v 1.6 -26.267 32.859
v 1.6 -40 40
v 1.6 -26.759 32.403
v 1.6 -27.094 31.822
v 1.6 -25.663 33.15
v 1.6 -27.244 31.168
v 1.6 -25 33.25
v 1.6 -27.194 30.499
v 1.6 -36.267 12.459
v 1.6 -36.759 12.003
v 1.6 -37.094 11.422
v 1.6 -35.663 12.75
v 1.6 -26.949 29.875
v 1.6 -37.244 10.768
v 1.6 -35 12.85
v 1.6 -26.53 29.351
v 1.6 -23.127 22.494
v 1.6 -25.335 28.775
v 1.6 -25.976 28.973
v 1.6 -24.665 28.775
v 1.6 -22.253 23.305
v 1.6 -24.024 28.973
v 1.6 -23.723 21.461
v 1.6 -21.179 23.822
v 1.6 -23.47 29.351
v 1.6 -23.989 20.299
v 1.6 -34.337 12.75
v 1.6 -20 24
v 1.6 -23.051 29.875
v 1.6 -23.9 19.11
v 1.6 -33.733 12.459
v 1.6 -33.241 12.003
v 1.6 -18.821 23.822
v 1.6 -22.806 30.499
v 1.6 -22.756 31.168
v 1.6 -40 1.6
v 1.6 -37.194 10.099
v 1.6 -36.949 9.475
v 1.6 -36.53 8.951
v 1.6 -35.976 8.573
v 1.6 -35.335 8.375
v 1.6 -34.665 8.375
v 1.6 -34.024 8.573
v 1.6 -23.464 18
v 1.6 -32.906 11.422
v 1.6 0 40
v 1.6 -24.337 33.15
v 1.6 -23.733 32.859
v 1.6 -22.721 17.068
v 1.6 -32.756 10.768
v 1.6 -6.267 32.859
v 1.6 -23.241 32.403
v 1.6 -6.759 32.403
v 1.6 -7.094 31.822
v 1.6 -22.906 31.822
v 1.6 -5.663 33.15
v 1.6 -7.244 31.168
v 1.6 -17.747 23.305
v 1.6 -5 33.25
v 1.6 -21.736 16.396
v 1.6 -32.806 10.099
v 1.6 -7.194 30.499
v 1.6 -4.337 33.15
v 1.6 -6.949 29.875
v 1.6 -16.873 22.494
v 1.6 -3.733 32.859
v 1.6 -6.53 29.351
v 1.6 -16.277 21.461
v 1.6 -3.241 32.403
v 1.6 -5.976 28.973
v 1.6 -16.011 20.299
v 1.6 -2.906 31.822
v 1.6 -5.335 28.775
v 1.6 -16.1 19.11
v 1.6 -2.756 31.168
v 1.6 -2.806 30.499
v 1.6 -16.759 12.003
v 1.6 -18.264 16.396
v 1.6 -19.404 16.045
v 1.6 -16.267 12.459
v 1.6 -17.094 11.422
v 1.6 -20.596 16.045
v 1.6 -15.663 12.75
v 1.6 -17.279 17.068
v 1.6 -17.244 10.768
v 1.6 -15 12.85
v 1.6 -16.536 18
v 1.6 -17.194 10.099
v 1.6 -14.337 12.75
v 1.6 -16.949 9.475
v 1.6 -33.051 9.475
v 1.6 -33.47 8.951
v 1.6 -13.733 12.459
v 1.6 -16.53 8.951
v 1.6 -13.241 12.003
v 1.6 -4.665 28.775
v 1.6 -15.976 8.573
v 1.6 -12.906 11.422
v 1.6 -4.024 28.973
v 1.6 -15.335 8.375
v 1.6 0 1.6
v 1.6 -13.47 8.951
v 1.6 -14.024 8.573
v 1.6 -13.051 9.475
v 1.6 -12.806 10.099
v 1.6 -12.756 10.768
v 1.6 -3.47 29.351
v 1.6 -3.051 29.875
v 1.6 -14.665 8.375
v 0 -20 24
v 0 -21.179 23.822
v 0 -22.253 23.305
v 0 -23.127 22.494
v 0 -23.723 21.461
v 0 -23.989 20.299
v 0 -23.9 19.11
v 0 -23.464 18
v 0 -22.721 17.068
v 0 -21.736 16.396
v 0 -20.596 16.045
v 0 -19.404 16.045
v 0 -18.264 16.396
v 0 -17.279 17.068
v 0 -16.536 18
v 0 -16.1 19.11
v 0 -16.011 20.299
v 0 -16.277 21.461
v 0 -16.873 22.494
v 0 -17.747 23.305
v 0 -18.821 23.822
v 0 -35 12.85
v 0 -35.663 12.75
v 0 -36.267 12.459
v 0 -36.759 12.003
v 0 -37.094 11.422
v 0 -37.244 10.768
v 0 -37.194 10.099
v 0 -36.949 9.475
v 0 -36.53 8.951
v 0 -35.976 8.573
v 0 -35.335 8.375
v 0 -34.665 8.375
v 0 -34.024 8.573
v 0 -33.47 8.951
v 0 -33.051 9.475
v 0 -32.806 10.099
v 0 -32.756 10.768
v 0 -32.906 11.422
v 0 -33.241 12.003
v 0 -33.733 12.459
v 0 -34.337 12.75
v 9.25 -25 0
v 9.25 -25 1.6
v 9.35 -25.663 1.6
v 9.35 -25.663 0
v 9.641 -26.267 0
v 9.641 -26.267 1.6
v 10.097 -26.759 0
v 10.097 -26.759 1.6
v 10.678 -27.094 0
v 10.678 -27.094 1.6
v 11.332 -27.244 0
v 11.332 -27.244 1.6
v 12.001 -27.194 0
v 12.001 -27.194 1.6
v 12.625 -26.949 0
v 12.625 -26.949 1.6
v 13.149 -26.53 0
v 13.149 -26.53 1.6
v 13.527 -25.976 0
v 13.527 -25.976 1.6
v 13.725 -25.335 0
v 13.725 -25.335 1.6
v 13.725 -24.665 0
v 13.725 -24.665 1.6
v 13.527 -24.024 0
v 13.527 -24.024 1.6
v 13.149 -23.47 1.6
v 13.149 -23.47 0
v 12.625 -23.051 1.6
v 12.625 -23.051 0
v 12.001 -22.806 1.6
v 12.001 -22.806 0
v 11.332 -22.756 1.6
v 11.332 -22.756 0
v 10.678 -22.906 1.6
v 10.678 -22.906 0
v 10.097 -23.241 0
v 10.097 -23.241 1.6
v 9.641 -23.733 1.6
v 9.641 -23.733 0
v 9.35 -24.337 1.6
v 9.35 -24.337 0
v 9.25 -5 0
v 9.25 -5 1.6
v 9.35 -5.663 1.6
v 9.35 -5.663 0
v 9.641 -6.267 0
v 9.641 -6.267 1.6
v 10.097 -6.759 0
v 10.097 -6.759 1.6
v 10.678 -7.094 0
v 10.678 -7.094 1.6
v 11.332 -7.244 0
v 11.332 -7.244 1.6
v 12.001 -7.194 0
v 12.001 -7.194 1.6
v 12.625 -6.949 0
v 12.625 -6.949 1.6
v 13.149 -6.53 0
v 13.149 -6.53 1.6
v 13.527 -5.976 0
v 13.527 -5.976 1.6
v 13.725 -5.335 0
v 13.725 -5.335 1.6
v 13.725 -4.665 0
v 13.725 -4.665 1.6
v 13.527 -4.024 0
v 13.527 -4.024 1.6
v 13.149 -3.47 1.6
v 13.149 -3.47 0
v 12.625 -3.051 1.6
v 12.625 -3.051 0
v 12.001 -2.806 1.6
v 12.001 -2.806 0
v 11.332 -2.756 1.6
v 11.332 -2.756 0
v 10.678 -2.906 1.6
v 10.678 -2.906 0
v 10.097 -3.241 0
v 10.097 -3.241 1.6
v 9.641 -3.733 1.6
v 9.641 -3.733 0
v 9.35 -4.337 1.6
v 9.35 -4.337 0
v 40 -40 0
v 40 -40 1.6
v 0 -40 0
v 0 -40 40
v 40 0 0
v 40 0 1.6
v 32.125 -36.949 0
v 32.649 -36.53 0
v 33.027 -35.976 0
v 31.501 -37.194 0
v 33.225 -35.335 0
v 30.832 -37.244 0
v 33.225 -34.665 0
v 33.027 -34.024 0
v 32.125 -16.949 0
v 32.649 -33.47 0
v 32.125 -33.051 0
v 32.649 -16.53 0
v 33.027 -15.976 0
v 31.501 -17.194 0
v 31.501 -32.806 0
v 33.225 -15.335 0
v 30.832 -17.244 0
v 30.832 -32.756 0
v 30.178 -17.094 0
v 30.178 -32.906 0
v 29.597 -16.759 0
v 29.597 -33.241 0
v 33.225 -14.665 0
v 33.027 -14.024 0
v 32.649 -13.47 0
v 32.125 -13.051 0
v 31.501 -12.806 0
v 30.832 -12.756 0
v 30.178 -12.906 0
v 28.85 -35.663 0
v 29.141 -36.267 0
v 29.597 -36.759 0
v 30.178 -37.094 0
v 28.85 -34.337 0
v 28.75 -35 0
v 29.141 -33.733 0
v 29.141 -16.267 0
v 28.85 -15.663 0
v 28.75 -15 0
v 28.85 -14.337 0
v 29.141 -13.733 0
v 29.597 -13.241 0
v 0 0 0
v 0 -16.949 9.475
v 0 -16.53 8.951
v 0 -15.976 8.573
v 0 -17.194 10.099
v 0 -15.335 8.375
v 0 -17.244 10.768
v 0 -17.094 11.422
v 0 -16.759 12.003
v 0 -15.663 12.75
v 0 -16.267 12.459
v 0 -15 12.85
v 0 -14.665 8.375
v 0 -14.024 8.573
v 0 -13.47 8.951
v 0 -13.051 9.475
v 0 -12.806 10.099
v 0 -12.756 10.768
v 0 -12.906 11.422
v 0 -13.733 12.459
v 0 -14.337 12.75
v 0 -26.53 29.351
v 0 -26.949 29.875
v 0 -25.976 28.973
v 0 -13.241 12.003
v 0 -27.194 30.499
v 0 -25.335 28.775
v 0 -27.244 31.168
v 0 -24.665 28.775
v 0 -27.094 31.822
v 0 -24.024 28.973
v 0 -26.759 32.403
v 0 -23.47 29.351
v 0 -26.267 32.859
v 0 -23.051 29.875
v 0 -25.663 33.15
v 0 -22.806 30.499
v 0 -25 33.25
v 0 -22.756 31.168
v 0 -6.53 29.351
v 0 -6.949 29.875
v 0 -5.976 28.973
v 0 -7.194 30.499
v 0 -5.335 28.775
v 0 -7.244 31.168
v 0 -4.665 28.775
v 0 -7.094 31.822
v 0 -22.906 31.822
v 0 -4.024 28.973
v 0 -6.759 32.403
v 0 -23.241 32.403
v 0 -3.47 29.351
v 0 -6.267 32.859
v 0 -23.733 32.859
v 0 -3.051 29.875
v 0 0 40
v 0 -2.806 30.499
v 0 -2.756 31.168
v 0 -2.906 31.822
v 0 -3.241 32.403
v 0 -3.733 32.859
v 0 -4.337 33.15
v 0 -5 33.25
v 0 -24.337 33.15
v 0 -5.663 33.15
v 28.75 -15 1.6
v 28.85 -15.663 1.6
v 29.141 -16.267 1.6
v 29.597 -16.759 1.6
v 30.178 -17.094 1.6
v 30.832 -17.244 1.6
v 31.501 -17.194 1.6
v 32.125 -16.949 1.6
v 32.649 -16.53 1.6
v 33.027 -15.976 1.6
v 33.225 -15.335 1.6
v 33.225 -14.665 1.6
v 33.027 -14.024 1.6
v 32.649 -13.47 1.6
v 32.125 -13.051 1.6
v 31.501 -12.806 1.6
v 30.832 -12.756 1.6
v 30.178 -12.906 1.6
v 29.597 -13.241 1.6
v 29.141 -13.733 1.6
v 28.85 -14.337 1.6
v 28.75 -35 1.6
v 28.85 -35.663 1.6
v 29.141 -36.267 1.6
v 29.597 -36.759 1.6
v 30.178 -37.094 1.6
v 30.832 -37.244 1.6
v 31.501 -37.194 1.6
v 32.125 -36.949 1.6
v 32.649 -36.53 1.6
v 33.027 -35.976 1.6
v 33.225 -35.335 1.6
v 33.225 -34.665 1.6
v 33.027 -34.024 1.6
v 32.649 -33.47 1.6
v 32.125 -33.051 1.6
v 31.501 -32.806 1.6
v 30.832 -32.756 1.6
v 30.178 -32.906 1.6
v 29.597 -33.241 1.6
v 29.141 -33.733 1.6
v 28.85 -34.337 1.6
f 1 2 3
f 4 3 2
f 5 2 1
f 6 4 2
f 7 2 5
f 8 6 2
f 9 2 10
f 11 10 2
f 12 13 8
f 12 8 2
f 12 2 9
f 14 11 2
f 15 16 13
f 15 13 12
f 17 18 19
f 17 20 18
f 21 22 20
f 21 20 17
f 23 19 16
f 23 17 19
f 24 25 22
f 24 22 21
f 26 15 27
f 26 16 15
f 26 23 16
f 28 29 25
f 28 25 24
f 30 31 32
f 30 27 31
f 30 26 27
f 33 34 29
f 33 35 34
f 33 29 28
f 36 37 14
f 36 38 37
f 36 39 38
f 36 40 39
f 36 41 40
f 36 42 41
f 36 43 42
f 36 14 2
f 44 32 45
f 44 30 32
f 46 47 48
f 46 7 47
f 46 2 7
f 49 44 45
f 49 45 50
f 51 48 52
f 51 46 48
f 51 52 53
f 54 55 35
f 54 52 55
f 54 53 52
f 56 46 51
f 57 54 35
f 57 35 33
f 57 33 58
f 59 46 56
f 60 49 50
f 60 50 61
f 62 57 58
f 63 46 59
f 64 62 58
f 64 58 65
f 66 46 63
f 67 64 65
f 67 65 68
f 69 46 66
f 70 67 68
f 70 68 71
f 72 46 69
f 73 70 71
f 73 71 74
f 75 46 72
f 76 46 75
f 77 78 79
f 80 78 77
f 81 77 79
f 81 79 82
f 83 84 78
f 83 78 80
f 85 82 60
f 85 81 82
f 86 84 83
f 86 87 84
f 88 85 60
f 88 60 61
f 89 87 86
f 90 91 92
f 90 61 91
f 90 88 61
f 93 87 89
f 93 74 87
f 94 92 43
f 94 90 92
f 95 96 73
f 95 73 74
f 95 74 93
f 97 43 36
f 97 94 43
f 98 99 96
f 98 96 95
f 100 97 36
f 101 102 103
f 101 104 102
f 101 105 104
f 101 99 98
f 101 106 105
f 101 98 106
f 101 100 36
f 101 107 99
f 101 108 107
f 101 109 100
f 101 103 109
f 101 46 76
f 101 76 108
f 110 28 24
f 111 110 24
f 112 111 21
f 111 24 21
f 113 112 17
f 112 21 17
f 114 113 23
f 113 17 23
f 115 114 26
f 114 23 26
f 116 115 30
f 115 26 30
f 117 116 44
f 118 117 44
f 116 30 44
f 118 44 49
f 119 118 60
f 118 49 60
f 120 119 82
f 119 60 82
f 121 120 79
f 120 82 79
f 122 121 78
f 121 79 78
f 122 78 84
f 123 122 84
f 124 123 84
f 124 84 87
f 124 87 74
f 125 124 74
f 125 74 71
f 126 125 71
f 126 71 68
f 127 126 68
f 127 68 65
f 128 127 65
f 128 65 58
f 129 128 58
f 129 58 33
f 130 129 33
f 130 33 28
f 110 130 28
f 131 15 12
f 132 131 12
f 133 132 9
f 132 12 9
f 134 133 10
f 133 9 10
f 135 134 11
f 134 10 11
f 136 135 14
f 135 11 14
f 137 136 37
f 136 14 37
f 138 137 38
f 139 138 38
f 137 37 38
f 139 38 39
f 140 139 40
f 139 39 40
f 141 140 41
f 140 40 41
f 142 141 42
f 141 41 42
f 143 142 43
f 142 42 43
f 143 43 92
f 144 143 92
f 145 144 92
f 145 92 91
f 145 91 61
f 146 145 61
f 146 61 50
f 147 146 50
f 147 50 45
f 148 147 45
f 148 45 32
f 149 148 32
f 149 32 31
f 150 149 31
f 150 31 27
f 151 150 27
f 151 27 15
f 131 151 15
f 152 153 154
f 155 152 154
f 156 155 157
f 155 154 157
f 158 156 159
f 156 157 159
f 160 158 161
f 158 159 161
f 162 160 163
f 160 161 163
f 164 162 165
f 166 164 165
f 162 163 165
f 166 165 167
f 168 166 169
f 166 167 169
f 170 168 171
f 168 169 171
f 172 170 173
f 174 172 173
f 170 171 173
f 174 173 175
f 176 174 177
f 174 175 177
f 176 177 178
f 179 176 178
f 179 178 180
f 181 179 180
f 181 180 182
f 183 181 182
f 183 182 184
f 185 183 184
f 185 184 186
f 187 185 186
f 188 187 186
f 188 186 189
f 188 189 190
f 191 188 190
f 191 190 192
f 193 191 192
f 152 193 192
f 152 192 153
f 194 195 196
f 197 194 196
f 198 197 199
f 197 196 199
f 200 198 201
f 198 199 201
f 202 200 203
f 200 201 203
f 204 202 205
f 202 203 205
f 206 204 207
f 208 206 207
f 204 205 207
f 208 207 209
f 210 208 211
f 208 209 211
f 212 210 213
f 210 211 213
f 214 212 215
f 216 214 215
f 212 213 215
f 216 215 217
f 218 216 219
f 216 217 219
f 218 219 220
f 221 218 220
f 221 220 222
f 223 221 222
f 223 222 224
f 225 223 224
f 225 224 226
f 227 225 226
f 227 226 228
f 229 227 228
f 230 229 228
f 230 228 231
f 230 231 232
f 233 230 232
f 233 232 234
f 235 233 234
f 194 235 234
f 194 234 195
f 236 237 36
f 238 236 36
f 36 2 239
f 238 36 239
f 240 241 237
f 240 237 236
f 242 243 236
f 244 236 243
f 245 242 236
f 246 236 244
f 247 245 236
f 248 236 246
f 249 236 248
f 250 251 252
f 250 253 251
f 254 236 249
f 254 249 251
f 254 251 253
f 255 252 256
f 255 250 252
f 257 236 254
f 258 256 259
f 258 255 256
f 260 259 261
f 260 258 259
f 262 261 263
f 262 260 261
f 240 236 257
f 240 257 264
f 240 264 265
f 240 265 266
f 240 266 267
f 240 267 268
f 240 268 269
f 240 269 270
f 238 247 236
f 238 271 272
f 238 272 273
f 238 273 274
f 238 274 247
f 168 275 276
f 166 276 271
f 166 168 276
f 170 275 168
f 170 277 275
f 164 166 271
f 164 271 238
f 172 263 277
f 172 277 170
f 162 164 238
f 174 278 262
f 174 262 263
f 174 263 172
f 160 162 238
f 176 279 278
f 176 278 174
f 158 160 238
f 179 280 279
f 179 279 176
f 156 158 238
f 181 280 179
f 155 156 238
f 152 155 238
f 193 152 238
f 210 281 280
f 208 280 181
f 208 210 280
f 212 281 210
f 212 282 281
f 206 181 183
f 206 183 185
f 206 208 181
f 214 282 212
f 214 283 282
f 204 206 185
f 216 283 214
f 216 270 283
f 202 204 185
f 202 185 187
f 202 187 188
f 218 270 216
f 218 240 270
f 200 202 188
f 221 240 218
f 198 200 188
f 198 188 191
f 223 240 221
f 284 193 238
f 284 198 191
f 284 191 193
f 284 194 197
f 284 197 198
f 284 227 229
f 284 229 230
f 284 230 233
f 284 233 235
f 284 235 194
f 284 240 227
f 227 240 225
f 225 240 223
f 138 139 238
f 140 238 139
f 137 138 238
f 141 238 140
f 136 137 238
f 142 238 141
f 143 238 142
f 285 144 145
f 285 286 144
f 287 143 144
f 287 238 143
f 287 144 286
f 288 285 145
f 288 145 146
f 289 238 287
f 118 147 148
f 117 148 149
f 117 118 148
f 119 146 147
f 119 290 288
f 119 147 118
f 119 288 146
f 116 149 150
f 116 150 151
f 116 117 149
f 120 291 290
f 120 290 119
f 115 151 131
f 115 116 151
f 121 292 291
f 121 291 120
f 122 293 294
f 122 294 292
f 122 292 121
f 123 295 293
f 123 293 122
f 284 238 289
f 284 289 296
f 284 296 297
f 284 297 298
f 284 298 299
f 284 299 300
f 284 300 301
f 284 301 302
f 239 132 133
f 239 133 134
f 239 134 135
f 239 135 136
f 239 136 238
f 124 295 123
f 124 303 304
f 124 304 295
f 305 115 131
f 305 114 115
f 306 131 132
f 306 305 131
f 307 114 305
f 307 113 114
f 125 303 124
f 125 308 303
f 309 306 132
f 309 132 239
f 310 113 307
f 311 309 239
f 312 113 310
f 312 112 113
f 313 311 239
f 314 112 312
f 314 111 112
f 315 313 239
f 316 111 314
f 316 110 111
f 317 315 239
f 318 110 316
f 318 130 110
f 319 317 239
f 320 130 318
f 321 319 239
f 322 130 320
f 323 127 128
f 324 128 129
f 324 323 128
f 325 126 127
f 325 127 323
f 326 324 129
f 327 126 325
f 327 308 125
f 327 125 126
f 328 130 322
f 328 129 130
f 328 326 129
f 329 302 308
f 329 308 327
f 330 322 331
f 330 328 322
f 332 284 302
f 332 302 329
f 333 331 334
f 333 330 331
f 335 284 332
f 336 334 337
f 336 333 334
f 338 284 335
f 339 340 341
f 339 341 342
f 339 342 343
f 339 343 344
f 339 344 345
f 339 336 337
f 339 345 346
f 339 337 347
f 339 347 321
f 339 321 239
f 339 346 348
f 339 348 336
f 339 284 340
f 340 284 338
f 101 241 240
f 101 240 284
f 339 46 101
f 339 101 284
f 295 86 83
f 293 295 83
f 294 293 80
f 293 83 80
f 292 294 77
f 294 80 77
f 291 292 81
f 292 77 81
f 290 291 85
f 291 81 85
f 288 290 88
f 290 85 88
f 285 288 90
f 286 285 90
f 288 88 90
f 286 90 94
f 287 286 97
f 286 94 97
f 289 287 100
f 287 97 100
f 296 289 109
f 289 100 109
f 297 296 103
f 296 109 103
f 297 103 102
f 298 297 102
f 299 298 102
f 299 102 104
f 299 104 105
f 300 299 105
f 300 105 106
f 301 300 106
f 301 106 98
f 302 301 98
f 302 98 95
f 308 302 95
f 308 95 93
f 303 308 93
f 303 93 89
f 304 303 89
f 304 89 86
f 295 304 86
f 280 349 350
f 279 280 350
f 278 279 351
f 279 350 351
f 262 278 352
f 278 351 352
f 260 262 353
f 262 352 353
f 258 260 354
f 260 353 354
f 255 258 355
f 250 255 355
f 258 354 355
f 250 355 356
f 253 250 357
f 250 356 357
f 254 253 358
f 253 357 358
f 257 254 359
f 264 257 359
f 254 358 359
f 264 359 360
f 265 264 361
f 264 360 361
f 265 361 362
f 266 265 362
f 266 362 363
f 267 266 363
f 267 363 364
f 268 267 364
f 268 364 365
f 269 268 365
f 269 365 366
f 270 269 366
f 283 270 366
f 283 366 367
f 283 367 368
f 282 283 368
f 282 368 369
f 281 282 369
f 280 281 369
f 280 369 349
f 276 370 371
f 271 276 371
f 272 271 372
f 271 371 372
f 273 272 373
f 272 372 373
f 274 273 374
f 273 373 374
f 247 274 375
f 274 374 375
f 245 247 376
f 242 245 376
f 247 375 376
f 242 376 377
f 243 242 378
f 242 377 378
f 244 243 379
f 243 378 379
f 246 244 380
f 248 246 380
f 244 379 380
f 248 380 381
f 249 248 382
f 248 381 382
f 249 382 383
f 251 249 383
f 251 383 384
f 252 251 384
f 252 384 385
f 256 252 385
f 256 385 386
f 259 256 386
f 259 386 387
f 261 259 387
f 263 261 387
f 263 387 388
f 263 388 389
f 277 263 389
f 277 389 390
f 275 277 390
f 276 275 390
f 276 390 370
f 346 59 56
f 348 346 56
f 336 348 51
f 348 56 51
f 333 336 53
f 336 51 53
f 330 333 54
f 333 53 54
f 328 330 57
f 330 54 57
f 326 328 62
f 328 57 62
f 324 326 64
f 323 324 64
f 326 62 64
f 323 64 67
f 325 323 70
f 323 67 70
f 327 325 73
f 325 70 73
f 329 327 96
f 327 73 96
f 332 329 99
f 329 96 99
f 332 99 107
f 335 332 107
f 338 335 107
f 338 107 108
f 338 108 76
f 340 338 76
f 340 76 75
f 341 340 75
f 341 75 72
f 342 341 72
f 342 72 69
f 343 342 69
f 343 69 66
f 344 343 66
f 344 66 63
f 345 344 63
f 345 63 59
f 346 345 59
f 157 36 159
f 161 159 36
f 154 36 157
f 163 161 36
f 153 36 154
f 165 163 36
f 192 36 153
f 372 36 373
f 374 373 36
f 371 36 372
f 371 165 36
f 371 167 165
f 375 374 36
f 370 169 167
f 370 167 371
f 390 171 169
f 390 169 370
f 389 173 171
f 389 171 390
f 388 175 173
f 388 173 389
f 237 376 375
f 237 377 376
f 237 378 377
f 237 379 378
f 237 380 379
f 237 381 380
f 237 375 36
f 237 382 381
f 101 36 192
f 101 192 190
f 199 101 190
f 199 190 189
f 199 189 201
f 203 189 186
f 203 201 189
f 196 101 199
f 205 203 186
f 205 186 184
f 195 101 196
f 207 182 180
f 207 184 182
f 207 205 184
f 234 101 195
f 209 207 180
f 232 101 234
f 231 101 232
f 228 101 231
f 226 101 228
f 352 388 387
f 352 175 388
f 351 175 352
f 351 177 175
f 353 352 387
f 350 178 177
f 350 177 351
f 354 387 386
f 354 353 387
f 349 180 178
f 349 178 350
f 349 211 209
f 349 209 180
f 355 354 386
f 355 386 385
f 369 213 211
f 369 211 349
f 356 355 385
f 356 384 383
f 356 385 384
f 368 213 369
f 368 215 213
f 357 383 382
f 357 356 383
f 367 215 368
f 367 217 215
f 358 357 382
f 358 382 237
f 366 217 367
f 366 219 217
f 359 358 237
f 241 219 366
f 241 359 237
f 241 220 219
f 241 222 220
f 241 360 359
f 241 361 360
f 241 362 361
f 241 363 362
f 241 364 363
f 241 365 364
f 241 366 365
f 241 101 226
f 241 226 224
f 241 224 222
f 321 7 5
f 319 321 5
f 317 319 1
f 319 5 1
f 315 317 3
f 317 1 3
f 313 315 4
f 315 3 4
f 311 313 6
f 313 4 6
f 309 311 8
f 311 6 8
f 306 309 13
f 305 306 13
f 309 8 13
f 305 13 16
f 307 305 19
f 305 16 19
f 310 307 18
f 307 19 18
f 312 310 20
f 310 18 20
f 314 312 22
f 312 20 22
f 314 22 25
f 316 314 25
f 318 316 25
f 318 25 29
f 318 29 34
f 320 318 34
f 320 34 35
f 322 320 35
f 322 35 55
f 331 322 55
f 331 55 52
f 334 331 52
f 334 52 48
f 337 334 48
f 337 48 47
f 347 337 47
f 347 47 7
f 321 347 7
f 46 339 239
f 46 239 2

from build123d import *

# Parameters (mm, degrees)
PAD_DEPTH       = 40
SKETCH001_R     = 2.25
SKETCH001_R_2   = 4
POCKET_DEPTH    = 1.601
COPYSKETCH002_R = 2.25
POCKET001_DEPTH = 5


with BuildPart() as part:
    # Sketch → Pad (new body)
    with BuildSketch(Plane.XZ):
        Polygon((0, 0), (0, 40), (1.6, 40), (1.6, 1.6), (40, 1.6), (40, 0), align=None)
    extrude(amount=PAD_DEPTH)

    # Sketch001 (on Face3 of Pad) → Pocket (cut, through all)
    with BuildSketch(Plane(origin=(1.6, 0, 0), x_dir=(0, 0, 1), z_dir=(1, 0, 0))):
        with Locations((10.6, 35)):
            Circle(SKETCH001_R)
        with Locations((31, 25)):
            Circle(SKETCH001_R)
        with Locations((10.6, 15)):
            Circle(SKETCH001_R)
        with Locations((31, 5)):
            Circle(SKETCH001_R)
        with Locations((20, 20)):
            Circle(SKETCH001_R_2)
    extrude(amount=-POCKET_DEPTH, mode=Mode.SUBTRACT)

    # CopySketch002 → Pocket001 (cut)
    with BuildSketch(Plane(origin=(0, 0, 2.5), x_dir=(-1, 0, 0), z_dir=(0, 0, 1))):
        with Locations((-11.5, 5)):
            Circle(COPYSKETCH002_R)
        with Locations((-31, 15)):
            Circle(COPYSKETCH002_R)
        with Locations((-11.5, 25)):
            Circle(COPYSKETCH002_R)
        with Locations((-31, 35)):
            Circle(COPYSKETCH002_R)
    extrude(amount=-POCKET001_DEPTH, mode=Mode.SUBTRACT)


solid = part.part
